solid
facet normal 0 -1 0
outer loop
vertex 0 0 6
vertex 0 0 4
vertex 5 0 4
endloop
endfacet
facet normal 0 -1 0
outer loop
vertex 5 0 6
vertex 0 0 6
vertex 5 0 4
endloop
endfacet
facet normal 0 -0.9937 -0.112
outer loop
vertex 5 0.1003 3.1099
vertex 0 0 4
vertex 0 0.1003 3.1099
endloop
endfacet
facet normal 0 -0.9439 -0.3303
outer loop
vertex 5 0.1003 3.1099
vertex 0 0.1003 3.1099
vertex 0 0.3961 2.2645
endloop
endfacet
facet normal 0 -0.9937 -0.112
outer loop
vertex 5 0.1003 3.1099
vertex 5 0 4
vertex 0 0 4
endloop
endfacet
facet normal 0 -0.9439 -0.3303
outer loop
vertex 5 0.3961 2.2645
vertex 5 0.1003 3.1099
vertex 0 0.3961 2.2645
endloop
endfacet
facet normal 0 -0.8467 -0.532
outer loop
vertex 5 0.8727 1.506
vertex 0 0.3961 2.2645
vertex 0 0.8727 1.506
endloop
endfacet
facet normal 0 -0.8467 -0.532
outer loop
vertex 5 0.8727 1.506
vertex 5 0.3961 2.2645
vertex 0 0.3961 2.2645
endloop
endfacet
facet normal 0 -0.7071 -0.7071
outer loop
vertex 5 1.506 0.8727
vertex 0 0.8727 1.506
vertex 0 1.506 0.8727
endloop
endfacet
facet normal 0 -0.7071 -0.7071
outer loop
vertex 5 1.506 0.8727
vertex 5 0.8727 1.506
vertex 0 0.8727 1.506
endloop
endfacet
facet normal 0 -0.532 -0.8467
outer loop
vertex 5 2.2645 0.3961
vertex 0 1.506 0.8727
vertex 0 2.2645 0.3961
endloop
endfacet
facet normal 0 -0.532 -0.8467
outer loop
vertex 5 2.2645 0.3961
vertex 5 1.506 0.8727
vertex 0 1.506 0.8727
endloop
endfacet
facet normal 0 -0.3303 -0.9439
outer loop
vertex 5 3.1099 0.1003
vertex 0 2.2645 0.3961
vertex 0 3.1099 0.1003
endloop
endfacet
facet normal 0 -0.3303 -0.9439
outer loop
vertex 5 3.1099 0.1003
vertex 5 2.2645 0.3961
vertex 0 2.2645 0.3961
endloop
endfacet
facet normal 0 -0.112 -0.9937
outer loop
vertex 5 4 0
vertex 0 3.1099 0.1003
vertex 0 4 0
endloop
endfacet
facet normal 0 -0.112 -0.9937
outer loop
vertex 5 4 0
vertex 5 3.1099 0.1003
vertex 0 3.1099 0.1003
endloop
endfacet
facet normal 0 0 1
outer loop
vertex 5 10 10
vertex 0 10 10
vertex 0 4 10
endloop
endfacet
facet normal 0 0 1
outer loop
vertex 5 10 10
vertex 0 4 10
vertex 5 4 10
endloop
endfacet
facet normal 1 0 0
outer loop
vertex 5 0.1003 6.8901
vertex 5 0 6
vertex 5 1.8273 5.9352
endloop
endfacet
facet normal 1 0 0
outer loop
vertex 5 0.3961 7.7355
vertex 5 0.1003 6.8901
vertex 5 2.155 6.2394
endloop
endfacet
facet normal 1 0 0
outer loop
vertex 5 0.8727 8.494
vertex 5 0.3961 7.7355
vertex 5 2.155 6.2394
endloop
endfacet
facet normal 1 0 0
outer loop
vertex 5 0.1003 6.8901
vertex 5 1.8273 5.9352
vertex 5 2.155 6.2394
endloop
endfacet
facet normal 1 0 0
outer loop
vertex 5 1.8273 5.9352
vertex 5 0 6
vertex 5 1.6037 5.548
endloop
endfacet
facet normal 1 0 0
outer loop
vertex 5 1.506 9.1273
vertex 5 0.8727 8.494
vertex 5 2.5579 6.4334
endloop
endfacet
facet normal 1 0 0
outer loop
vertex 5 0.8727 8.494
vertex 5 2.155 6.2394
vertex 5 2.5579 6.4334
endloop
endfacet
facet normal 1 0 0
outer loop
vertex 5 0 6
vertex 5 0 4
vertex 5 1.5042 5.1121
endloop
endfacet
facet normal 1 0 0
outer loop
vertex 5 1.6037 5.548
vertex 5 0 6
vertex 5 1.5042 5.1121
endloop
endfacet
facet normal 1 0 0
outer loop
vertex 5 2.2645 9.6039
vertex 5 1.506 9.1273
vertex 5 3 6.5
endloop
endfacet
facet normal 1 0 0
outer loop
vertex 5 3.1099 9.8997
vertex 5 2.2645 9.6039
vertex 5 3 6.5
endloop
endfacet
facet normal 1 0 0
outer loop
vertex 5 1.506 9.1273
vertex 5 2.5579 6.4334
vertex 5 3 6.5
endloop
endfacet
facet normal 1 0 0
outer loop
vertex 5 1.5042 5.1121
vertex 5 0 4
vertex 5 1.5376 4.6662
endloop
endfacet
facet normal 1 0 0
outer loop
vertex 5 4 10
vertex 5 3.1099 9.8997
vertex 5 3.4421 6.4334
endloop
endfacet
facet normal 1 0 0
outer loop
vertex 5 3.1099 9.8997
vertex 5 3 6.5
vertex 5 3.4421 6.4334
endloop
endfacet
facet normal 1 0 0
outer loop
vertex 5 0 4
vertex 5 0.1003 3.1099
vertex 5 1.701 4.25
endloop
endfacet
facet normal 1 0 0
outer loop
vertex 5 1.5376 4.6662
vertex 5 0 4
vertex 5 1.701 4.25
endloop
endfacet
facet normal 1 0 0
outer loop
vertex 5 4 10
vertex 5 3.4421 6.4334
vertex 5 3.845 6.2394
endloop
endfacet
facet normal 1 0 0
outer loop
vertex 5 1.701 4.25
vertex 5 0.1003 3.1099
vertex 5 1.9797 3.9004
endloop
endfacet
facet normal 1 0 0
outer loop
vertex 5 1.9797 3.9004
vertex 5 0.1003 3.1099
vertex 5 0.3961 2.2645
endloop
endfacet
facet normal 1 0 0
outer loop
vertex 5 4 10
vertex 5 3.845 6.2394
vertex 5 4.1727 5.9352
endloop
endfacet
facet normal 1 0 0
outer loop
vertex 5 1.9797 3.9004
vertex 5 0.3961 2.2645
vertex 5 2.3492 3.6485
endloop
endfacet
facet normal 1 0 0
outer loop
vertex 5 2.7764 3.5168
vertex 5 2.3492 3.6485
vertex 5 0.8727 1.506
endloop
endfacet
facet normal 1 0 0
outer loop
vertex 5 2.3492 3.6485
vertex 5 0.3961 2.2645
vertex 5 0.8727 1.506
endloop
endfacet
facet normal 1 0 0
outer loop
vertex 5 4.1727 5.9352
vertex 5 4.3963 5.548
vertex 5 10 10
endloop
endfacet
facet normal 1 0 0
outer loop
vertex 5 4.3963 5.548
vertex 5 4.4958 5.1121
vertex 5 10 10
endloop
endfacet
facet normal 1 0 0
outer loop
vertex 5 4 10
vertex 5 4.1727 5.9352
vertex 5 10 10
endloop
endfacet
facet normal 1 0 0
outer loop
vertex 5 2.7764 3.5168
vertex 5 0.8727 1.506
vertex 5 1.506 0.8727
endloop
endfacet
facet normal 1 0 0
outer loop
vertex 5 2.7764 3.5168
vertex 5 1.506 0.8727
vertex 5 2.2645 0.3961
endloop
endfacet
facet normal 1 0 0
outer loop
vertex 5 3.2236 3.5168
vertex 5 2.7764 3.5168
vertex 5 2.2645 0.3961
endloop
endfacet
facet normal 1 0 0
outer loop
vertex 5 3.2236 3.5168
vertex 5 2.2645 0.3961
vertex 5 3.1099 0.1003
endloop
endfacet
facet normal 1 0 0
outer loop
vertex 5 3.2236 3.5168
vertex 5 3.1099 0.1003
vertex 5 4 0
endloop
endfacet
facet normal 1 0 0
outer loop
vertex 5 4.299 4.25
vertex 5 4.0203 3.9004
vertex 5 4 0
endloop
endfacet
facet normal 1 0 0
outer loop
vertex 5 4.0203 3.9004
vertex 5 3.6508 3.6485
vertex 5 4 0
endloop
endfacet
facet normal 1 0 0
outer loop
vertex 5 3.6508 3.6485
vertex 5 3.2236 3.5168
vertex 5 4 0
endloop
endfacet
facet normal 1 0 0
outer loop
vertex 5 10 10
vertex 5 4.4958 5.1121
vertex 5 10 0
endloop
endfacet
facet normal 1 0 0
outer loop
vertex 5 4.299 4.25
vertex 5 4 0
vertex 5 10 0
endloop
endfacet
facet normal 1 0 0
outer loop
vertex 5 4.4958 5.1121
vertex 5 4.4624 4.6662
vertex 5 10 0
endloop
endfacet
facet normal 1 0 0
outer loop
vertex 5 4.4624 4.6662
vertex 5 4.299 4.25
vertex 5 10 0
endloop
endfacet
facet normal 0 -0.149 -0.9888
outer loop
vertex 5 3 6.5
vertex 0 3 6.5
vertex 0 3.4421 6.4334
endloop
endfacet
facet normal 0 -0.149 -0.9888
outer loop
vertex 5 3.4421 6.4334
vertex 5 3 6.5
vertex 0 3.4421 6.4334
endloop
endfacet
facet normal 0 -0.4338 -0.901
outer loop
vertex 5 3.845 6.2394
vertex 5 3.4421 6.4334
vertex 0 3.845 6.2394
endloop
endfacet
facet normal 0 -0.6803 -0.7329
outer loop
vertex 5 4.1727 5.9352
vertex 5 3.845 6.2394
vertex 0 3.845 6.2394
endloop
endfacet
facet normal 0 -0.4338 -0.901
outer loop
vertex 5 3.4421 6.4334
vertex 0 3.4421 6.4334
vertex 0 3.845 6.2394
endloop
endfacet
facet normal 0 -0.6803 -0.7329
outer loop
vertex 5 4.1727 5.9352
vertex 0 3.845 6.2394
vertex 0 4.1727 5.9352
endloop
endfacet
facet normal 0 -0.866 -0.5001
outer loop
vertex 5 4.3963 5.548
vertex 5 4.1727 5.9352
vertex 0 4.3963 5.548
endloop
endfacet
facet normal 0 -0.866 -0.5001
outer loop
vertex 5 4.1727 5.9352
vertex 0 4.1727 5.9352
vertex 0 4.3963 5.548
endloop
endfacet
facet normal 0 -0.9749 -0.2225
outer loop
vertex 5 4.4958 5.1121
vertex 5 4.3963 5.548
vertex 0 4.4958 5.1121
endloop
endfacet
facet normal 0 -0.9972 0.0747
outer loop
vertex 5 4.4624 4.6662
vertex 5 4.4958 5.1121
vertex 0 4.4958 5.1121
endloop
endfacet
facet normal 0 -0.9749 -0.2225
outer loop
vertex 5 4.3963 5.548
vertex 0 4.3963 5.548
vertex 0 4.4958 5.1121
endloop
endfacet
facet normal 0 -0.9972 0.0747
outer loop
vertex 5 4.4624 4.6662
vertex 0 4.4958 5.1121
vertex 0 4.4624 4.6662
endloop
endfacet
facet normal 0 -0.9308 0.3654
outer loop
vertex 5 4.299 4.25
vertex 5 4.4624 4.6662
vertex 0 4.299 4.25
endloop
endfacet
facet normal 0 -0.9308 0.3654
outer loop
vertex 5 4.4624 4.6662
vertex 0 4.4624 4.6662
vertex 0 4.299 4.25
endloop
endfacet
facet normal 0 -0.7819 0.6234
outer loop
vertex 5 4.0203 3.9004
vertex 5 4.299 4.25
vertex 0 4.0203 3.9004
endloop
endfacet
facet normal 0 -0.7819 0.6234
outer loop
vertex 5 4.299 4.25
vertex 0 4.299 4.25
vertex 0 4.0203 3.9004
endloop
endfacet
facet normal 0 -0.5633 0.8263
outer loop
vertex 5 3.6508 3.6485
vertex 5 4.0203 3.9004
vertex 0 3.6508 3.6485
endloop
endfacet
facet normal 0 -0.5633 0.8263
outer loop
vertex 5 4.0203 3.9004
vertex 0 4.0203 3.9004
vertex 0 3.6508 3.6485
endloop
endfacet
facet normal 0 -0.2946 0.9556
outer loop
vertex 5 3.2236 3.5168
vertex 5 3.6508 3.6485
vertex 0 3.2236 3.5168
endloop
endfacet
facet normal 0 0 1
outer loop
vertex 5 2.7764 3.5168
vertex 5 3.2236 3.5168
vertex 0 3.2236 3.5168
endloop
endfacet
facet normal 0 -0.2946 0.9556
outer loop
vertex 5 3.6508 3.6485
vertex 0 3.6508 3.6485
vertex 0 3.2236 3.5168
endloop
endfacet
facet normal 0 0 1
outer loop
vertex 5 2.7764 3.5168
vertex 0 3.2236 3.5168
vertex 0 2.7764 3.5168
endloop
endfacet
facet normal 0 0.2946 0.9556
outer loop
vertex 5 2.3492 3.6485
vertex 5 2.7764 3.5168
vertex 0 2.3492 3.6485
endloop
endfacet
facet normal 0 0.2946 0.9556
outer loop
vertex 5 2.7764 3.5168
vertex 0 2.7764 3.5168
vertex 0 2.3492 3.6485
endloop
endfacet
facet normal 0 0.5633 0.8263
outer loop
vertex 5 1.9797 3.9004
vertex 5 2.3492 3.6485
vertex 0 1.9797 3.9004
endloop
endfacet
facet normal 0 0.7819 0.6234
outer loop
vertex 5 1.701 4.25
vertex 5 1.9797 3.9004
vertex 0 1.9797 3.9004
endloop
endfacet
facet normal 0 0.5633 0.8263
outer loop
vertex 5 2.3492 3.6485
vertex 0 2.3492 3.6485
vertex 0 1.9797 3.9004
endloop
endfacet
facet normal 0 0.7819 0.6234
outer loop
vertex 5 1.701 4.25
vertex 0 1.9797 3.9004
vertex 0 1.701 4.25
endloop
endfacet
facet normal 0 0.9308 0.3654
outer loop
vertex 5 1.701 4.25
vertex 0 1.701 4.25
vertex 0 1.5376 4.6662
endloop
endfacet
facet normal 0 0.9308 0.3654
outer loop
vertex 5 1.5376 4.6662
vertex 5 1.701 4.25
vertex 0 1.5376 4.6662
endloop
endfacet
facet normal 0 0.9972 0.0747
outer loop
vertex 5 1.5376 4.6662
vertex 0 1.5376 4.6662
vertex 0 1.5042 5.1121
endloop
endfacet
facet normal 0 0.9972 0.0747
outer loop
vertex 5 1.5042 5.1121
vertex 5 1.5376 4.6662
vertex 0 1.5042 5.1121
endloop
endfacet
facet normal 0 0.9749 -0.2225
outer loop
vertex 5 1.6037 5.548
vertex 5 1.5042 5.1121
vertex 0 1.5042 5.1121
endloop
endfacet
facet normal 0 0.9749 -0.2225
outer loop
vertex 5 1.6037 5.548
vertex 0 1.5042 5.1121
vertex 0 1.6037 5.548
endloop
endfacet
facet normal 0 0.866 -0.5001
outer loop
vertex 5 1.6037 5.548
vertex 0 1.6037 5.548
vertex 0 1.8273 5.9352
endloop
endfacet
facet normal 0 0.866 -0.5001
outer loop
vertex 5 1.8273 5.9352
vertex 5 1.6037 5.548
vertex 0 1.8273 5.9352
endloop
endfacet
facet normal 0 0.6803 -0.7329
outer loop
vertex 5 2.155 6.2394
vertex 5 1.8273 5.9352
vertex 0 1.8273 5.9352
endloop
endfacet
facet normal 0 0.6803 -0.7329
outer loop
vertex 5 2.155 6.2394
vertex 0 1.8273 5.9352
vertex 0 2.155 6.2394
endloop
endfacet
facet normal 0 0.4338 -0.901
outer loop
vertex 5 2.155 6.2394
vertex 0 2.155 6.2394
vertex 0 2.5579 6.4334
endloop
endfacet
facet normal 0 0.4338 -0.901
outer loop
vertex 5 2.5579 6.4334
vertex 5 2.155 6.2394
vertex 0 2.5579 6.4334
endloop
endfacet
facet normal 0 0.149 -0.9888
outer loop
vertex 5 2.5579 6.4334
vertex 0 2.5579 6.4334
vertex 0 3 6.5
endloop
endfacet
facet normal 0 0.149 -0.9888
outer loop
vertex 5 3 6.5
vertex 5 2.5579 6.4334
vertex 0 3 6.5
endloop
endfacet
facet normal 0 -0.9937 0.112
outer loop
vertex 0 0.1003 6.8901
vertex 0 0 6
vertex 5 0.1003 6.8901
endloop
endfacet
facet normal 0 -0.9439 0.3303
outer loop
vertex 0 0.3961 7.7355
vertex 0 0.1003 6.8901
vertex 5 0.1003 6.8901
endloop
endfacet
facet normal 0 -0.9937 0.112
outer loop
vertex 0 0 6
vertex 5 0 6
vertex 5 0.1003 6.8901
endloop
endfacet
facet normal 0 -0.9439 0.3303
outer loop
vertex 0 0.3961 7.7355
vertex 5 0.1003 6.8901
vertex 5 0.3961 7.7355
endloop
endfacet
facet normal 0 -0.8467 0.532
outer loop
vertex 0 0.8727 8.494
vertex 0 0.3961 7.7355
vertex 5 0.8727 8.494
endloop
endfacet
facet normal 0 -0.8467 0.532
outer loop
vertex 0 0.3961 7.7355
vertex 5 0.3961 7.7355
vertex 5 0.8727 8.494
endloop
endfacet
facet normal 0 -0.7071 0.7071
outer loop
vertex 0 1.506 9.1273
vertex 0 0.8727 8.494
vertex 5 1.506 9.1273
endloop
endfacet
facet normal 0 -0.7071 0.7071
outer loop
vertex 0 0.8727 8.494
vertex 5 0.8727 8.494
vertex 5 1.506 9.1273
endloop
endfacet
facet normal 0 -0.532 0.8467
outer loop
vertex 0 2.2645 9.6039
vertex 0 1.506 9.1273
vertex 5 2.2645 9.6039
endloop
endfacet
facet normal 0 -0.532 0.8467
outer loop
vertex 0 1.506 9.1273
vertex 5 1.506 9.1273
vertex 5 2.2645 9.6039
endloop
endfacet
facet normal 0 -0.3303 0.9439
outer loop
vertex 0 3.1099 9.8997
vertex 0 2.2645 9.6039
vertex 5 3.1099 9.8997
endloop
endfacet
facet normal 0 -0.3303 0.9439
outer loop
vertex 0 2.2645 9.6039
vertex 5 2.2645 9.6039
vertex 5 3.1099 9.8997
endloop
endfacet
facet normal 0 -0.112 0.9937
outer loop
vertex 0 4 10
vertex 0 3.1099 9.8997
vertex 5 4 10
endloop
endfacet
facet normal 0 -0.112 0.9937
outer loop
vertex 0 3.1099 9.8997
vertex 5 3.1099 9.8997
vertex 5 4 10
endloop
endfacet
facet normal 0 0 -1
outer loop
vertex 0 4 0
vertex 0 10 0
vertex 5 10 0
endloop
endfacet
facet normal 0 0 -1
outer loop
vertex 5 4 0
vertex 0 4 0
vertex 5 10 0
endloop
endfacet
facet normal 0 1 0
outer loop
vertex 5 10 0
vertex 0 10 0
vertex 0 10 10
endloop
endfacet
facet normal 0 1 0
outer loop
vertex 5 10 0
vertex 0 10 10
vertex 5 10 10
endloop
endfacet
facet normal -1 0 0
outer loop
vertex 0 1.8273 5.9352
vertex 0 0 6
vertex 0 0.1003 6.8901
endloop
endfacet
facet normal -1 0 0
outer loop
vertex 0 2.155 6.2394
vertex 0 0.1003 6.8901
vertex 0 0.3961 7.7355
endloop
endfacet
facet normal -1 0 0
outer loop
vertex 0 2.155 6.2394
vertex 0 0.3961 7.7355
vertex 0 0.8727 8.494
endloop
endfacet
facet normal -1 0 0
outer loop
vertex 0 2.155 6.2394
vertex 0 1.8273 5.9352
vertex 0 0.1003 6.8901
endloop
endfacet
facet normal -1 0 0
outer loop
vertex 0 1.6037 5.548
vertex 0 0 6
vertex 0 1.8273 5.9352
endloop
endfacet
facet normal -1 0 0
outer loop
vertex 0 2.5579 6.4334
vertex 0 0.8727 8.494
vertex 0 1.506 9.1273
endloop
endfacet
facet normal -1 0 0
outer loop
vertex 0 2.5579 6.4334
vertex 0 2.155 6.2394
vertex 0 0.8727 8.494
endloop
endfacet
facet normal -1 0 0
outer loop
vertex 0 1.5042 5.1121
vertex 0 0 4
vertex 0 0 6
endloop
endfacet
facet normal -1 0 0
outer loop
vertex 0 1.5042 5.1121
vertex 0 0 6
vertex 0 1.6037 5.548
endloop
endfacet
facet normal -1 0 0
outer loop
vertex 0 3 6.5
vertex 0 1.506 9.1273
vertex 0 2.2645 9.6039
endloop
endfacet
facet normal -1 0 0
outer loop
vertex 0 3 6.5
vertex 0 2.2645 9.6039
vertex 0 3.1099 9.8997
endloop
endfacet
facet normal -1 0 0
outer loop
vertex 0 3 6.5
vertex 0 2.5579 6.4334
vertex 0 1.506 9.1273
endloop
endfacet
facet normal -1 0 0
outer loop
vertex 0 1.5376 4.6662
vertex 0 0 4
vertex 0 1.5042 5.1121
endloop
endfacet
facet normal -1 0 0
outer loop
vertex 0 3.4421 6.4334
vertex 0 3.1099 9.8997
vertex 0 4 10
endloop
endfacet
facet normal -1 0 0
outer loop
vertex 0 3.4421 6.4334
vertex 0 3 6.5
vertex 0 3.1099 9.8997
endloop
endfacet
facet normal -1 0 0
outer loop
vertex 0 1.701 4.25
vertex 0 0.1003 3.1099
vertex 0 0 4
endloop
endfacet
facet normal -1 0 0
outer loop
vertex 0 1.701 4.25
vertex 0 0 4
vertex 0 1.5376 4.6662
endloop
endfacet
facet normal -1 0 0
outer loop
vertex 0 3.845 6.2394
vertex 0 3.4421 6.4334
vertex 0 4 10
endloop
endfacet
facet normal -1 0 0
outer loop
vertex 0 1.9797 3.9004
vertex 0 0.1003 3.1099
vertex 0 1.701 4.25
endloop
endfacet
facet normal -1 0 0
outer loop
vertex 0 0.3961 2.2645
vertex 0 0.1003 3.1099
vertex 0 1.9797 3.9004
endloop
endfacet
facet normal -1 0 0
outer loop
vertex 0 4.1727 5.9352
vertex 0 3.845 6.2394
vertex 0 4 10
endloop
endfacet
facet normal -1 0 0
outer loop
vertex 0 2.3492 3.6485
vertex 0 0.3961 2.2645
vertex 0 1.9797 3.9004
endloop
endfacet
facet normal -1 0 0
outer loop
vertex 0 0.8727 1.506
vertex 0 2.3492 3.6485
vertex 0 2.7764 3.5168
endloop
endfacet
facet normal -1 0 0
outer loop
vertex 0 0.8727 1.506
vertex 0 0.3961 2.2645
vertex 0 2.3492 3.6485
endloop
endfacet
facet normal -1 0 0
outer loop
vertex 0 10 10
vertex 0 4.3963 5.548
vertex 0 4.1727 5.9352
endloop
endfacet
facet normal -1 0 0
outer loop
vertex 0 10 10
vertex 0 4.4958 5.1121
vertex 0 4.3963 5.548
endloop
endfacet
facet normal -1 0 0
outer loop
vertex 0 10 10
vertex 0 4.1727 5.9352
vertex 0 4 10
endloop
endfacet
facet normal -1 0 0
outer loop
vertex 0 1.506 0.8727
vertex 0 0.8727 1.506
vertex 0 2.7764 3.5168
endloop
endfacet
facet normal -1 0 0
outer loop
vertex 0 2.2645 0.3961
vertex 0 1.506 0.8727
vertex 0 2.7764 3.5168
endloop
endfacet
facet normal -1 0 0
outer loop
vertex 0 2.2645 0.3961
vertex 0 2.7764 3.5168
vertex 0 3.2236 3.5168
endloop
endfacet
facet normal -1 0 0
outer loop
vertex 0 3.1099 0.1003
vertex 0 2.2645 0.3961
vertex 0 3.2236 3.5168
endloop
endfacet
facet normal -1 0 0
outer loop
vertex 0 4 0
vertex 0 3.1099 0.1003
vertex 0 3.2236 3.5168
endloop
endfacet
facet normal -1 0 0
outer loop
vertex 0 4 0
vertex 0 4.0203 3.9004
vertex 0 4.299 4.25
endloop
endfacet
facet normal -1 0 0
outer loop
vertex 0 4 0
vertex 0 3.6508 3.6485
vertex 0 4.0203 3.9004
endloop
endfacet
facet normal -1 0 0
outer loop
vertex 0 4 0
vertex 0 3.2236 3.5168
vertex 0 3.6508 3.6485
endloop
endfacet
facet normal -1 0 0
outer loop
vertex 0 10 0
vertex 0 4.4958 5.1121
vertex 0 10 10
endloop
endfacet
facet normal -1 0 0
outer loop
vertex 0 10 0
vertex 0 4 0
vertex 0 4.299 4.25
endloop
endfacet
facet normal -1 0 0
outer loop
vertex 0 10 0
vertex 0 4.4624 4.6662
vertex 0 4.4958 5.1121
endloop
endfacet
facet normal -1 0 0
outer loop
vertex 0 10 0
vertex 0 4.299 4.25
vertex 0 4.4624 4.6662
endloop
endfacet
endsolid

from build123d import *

# Parameters (mm, degrees)
SKETCH1_W           = 5
SKETCH1_H           = 10
BOSS_EXTRUDE1_DEPTH = 10
SKETCH2_R           = 1.5
CUT_EXTRUDE1_DEPTH  = 16
FILLET1_R           = 4


with BuildPart() as part:
    # Sketch1 → Boss-Extrude1 (new body)
    with BuildSketch(Plane.XY):
        with Locations((2.5, 5)):
            Rectangle(SKETCH1_W, SKETCH1_H)
    extrude(amount=BOSS_EXTRUDE1_DEPTH)

    # Sketch2 → Cut-Extrude1 (cut, through all)
    with BuildSketch(Plane.ZY):
        with Locations((5, 3)):
            Circle(SKETCH2_R)
    extrude(amount=-CUT_EXTRUDE1_DEPTH, mode=Mode.SUBTRACT)

    # Fillet1
    fillet1_edges = [part.edges().sort_by_distance(p)[0] for p in [
        (2.5, 0, 0),
        (2.5, 0, 10),
    ]]
    fillet(fillet1_edges, radius=FILLET1_R)


solid = part.part
